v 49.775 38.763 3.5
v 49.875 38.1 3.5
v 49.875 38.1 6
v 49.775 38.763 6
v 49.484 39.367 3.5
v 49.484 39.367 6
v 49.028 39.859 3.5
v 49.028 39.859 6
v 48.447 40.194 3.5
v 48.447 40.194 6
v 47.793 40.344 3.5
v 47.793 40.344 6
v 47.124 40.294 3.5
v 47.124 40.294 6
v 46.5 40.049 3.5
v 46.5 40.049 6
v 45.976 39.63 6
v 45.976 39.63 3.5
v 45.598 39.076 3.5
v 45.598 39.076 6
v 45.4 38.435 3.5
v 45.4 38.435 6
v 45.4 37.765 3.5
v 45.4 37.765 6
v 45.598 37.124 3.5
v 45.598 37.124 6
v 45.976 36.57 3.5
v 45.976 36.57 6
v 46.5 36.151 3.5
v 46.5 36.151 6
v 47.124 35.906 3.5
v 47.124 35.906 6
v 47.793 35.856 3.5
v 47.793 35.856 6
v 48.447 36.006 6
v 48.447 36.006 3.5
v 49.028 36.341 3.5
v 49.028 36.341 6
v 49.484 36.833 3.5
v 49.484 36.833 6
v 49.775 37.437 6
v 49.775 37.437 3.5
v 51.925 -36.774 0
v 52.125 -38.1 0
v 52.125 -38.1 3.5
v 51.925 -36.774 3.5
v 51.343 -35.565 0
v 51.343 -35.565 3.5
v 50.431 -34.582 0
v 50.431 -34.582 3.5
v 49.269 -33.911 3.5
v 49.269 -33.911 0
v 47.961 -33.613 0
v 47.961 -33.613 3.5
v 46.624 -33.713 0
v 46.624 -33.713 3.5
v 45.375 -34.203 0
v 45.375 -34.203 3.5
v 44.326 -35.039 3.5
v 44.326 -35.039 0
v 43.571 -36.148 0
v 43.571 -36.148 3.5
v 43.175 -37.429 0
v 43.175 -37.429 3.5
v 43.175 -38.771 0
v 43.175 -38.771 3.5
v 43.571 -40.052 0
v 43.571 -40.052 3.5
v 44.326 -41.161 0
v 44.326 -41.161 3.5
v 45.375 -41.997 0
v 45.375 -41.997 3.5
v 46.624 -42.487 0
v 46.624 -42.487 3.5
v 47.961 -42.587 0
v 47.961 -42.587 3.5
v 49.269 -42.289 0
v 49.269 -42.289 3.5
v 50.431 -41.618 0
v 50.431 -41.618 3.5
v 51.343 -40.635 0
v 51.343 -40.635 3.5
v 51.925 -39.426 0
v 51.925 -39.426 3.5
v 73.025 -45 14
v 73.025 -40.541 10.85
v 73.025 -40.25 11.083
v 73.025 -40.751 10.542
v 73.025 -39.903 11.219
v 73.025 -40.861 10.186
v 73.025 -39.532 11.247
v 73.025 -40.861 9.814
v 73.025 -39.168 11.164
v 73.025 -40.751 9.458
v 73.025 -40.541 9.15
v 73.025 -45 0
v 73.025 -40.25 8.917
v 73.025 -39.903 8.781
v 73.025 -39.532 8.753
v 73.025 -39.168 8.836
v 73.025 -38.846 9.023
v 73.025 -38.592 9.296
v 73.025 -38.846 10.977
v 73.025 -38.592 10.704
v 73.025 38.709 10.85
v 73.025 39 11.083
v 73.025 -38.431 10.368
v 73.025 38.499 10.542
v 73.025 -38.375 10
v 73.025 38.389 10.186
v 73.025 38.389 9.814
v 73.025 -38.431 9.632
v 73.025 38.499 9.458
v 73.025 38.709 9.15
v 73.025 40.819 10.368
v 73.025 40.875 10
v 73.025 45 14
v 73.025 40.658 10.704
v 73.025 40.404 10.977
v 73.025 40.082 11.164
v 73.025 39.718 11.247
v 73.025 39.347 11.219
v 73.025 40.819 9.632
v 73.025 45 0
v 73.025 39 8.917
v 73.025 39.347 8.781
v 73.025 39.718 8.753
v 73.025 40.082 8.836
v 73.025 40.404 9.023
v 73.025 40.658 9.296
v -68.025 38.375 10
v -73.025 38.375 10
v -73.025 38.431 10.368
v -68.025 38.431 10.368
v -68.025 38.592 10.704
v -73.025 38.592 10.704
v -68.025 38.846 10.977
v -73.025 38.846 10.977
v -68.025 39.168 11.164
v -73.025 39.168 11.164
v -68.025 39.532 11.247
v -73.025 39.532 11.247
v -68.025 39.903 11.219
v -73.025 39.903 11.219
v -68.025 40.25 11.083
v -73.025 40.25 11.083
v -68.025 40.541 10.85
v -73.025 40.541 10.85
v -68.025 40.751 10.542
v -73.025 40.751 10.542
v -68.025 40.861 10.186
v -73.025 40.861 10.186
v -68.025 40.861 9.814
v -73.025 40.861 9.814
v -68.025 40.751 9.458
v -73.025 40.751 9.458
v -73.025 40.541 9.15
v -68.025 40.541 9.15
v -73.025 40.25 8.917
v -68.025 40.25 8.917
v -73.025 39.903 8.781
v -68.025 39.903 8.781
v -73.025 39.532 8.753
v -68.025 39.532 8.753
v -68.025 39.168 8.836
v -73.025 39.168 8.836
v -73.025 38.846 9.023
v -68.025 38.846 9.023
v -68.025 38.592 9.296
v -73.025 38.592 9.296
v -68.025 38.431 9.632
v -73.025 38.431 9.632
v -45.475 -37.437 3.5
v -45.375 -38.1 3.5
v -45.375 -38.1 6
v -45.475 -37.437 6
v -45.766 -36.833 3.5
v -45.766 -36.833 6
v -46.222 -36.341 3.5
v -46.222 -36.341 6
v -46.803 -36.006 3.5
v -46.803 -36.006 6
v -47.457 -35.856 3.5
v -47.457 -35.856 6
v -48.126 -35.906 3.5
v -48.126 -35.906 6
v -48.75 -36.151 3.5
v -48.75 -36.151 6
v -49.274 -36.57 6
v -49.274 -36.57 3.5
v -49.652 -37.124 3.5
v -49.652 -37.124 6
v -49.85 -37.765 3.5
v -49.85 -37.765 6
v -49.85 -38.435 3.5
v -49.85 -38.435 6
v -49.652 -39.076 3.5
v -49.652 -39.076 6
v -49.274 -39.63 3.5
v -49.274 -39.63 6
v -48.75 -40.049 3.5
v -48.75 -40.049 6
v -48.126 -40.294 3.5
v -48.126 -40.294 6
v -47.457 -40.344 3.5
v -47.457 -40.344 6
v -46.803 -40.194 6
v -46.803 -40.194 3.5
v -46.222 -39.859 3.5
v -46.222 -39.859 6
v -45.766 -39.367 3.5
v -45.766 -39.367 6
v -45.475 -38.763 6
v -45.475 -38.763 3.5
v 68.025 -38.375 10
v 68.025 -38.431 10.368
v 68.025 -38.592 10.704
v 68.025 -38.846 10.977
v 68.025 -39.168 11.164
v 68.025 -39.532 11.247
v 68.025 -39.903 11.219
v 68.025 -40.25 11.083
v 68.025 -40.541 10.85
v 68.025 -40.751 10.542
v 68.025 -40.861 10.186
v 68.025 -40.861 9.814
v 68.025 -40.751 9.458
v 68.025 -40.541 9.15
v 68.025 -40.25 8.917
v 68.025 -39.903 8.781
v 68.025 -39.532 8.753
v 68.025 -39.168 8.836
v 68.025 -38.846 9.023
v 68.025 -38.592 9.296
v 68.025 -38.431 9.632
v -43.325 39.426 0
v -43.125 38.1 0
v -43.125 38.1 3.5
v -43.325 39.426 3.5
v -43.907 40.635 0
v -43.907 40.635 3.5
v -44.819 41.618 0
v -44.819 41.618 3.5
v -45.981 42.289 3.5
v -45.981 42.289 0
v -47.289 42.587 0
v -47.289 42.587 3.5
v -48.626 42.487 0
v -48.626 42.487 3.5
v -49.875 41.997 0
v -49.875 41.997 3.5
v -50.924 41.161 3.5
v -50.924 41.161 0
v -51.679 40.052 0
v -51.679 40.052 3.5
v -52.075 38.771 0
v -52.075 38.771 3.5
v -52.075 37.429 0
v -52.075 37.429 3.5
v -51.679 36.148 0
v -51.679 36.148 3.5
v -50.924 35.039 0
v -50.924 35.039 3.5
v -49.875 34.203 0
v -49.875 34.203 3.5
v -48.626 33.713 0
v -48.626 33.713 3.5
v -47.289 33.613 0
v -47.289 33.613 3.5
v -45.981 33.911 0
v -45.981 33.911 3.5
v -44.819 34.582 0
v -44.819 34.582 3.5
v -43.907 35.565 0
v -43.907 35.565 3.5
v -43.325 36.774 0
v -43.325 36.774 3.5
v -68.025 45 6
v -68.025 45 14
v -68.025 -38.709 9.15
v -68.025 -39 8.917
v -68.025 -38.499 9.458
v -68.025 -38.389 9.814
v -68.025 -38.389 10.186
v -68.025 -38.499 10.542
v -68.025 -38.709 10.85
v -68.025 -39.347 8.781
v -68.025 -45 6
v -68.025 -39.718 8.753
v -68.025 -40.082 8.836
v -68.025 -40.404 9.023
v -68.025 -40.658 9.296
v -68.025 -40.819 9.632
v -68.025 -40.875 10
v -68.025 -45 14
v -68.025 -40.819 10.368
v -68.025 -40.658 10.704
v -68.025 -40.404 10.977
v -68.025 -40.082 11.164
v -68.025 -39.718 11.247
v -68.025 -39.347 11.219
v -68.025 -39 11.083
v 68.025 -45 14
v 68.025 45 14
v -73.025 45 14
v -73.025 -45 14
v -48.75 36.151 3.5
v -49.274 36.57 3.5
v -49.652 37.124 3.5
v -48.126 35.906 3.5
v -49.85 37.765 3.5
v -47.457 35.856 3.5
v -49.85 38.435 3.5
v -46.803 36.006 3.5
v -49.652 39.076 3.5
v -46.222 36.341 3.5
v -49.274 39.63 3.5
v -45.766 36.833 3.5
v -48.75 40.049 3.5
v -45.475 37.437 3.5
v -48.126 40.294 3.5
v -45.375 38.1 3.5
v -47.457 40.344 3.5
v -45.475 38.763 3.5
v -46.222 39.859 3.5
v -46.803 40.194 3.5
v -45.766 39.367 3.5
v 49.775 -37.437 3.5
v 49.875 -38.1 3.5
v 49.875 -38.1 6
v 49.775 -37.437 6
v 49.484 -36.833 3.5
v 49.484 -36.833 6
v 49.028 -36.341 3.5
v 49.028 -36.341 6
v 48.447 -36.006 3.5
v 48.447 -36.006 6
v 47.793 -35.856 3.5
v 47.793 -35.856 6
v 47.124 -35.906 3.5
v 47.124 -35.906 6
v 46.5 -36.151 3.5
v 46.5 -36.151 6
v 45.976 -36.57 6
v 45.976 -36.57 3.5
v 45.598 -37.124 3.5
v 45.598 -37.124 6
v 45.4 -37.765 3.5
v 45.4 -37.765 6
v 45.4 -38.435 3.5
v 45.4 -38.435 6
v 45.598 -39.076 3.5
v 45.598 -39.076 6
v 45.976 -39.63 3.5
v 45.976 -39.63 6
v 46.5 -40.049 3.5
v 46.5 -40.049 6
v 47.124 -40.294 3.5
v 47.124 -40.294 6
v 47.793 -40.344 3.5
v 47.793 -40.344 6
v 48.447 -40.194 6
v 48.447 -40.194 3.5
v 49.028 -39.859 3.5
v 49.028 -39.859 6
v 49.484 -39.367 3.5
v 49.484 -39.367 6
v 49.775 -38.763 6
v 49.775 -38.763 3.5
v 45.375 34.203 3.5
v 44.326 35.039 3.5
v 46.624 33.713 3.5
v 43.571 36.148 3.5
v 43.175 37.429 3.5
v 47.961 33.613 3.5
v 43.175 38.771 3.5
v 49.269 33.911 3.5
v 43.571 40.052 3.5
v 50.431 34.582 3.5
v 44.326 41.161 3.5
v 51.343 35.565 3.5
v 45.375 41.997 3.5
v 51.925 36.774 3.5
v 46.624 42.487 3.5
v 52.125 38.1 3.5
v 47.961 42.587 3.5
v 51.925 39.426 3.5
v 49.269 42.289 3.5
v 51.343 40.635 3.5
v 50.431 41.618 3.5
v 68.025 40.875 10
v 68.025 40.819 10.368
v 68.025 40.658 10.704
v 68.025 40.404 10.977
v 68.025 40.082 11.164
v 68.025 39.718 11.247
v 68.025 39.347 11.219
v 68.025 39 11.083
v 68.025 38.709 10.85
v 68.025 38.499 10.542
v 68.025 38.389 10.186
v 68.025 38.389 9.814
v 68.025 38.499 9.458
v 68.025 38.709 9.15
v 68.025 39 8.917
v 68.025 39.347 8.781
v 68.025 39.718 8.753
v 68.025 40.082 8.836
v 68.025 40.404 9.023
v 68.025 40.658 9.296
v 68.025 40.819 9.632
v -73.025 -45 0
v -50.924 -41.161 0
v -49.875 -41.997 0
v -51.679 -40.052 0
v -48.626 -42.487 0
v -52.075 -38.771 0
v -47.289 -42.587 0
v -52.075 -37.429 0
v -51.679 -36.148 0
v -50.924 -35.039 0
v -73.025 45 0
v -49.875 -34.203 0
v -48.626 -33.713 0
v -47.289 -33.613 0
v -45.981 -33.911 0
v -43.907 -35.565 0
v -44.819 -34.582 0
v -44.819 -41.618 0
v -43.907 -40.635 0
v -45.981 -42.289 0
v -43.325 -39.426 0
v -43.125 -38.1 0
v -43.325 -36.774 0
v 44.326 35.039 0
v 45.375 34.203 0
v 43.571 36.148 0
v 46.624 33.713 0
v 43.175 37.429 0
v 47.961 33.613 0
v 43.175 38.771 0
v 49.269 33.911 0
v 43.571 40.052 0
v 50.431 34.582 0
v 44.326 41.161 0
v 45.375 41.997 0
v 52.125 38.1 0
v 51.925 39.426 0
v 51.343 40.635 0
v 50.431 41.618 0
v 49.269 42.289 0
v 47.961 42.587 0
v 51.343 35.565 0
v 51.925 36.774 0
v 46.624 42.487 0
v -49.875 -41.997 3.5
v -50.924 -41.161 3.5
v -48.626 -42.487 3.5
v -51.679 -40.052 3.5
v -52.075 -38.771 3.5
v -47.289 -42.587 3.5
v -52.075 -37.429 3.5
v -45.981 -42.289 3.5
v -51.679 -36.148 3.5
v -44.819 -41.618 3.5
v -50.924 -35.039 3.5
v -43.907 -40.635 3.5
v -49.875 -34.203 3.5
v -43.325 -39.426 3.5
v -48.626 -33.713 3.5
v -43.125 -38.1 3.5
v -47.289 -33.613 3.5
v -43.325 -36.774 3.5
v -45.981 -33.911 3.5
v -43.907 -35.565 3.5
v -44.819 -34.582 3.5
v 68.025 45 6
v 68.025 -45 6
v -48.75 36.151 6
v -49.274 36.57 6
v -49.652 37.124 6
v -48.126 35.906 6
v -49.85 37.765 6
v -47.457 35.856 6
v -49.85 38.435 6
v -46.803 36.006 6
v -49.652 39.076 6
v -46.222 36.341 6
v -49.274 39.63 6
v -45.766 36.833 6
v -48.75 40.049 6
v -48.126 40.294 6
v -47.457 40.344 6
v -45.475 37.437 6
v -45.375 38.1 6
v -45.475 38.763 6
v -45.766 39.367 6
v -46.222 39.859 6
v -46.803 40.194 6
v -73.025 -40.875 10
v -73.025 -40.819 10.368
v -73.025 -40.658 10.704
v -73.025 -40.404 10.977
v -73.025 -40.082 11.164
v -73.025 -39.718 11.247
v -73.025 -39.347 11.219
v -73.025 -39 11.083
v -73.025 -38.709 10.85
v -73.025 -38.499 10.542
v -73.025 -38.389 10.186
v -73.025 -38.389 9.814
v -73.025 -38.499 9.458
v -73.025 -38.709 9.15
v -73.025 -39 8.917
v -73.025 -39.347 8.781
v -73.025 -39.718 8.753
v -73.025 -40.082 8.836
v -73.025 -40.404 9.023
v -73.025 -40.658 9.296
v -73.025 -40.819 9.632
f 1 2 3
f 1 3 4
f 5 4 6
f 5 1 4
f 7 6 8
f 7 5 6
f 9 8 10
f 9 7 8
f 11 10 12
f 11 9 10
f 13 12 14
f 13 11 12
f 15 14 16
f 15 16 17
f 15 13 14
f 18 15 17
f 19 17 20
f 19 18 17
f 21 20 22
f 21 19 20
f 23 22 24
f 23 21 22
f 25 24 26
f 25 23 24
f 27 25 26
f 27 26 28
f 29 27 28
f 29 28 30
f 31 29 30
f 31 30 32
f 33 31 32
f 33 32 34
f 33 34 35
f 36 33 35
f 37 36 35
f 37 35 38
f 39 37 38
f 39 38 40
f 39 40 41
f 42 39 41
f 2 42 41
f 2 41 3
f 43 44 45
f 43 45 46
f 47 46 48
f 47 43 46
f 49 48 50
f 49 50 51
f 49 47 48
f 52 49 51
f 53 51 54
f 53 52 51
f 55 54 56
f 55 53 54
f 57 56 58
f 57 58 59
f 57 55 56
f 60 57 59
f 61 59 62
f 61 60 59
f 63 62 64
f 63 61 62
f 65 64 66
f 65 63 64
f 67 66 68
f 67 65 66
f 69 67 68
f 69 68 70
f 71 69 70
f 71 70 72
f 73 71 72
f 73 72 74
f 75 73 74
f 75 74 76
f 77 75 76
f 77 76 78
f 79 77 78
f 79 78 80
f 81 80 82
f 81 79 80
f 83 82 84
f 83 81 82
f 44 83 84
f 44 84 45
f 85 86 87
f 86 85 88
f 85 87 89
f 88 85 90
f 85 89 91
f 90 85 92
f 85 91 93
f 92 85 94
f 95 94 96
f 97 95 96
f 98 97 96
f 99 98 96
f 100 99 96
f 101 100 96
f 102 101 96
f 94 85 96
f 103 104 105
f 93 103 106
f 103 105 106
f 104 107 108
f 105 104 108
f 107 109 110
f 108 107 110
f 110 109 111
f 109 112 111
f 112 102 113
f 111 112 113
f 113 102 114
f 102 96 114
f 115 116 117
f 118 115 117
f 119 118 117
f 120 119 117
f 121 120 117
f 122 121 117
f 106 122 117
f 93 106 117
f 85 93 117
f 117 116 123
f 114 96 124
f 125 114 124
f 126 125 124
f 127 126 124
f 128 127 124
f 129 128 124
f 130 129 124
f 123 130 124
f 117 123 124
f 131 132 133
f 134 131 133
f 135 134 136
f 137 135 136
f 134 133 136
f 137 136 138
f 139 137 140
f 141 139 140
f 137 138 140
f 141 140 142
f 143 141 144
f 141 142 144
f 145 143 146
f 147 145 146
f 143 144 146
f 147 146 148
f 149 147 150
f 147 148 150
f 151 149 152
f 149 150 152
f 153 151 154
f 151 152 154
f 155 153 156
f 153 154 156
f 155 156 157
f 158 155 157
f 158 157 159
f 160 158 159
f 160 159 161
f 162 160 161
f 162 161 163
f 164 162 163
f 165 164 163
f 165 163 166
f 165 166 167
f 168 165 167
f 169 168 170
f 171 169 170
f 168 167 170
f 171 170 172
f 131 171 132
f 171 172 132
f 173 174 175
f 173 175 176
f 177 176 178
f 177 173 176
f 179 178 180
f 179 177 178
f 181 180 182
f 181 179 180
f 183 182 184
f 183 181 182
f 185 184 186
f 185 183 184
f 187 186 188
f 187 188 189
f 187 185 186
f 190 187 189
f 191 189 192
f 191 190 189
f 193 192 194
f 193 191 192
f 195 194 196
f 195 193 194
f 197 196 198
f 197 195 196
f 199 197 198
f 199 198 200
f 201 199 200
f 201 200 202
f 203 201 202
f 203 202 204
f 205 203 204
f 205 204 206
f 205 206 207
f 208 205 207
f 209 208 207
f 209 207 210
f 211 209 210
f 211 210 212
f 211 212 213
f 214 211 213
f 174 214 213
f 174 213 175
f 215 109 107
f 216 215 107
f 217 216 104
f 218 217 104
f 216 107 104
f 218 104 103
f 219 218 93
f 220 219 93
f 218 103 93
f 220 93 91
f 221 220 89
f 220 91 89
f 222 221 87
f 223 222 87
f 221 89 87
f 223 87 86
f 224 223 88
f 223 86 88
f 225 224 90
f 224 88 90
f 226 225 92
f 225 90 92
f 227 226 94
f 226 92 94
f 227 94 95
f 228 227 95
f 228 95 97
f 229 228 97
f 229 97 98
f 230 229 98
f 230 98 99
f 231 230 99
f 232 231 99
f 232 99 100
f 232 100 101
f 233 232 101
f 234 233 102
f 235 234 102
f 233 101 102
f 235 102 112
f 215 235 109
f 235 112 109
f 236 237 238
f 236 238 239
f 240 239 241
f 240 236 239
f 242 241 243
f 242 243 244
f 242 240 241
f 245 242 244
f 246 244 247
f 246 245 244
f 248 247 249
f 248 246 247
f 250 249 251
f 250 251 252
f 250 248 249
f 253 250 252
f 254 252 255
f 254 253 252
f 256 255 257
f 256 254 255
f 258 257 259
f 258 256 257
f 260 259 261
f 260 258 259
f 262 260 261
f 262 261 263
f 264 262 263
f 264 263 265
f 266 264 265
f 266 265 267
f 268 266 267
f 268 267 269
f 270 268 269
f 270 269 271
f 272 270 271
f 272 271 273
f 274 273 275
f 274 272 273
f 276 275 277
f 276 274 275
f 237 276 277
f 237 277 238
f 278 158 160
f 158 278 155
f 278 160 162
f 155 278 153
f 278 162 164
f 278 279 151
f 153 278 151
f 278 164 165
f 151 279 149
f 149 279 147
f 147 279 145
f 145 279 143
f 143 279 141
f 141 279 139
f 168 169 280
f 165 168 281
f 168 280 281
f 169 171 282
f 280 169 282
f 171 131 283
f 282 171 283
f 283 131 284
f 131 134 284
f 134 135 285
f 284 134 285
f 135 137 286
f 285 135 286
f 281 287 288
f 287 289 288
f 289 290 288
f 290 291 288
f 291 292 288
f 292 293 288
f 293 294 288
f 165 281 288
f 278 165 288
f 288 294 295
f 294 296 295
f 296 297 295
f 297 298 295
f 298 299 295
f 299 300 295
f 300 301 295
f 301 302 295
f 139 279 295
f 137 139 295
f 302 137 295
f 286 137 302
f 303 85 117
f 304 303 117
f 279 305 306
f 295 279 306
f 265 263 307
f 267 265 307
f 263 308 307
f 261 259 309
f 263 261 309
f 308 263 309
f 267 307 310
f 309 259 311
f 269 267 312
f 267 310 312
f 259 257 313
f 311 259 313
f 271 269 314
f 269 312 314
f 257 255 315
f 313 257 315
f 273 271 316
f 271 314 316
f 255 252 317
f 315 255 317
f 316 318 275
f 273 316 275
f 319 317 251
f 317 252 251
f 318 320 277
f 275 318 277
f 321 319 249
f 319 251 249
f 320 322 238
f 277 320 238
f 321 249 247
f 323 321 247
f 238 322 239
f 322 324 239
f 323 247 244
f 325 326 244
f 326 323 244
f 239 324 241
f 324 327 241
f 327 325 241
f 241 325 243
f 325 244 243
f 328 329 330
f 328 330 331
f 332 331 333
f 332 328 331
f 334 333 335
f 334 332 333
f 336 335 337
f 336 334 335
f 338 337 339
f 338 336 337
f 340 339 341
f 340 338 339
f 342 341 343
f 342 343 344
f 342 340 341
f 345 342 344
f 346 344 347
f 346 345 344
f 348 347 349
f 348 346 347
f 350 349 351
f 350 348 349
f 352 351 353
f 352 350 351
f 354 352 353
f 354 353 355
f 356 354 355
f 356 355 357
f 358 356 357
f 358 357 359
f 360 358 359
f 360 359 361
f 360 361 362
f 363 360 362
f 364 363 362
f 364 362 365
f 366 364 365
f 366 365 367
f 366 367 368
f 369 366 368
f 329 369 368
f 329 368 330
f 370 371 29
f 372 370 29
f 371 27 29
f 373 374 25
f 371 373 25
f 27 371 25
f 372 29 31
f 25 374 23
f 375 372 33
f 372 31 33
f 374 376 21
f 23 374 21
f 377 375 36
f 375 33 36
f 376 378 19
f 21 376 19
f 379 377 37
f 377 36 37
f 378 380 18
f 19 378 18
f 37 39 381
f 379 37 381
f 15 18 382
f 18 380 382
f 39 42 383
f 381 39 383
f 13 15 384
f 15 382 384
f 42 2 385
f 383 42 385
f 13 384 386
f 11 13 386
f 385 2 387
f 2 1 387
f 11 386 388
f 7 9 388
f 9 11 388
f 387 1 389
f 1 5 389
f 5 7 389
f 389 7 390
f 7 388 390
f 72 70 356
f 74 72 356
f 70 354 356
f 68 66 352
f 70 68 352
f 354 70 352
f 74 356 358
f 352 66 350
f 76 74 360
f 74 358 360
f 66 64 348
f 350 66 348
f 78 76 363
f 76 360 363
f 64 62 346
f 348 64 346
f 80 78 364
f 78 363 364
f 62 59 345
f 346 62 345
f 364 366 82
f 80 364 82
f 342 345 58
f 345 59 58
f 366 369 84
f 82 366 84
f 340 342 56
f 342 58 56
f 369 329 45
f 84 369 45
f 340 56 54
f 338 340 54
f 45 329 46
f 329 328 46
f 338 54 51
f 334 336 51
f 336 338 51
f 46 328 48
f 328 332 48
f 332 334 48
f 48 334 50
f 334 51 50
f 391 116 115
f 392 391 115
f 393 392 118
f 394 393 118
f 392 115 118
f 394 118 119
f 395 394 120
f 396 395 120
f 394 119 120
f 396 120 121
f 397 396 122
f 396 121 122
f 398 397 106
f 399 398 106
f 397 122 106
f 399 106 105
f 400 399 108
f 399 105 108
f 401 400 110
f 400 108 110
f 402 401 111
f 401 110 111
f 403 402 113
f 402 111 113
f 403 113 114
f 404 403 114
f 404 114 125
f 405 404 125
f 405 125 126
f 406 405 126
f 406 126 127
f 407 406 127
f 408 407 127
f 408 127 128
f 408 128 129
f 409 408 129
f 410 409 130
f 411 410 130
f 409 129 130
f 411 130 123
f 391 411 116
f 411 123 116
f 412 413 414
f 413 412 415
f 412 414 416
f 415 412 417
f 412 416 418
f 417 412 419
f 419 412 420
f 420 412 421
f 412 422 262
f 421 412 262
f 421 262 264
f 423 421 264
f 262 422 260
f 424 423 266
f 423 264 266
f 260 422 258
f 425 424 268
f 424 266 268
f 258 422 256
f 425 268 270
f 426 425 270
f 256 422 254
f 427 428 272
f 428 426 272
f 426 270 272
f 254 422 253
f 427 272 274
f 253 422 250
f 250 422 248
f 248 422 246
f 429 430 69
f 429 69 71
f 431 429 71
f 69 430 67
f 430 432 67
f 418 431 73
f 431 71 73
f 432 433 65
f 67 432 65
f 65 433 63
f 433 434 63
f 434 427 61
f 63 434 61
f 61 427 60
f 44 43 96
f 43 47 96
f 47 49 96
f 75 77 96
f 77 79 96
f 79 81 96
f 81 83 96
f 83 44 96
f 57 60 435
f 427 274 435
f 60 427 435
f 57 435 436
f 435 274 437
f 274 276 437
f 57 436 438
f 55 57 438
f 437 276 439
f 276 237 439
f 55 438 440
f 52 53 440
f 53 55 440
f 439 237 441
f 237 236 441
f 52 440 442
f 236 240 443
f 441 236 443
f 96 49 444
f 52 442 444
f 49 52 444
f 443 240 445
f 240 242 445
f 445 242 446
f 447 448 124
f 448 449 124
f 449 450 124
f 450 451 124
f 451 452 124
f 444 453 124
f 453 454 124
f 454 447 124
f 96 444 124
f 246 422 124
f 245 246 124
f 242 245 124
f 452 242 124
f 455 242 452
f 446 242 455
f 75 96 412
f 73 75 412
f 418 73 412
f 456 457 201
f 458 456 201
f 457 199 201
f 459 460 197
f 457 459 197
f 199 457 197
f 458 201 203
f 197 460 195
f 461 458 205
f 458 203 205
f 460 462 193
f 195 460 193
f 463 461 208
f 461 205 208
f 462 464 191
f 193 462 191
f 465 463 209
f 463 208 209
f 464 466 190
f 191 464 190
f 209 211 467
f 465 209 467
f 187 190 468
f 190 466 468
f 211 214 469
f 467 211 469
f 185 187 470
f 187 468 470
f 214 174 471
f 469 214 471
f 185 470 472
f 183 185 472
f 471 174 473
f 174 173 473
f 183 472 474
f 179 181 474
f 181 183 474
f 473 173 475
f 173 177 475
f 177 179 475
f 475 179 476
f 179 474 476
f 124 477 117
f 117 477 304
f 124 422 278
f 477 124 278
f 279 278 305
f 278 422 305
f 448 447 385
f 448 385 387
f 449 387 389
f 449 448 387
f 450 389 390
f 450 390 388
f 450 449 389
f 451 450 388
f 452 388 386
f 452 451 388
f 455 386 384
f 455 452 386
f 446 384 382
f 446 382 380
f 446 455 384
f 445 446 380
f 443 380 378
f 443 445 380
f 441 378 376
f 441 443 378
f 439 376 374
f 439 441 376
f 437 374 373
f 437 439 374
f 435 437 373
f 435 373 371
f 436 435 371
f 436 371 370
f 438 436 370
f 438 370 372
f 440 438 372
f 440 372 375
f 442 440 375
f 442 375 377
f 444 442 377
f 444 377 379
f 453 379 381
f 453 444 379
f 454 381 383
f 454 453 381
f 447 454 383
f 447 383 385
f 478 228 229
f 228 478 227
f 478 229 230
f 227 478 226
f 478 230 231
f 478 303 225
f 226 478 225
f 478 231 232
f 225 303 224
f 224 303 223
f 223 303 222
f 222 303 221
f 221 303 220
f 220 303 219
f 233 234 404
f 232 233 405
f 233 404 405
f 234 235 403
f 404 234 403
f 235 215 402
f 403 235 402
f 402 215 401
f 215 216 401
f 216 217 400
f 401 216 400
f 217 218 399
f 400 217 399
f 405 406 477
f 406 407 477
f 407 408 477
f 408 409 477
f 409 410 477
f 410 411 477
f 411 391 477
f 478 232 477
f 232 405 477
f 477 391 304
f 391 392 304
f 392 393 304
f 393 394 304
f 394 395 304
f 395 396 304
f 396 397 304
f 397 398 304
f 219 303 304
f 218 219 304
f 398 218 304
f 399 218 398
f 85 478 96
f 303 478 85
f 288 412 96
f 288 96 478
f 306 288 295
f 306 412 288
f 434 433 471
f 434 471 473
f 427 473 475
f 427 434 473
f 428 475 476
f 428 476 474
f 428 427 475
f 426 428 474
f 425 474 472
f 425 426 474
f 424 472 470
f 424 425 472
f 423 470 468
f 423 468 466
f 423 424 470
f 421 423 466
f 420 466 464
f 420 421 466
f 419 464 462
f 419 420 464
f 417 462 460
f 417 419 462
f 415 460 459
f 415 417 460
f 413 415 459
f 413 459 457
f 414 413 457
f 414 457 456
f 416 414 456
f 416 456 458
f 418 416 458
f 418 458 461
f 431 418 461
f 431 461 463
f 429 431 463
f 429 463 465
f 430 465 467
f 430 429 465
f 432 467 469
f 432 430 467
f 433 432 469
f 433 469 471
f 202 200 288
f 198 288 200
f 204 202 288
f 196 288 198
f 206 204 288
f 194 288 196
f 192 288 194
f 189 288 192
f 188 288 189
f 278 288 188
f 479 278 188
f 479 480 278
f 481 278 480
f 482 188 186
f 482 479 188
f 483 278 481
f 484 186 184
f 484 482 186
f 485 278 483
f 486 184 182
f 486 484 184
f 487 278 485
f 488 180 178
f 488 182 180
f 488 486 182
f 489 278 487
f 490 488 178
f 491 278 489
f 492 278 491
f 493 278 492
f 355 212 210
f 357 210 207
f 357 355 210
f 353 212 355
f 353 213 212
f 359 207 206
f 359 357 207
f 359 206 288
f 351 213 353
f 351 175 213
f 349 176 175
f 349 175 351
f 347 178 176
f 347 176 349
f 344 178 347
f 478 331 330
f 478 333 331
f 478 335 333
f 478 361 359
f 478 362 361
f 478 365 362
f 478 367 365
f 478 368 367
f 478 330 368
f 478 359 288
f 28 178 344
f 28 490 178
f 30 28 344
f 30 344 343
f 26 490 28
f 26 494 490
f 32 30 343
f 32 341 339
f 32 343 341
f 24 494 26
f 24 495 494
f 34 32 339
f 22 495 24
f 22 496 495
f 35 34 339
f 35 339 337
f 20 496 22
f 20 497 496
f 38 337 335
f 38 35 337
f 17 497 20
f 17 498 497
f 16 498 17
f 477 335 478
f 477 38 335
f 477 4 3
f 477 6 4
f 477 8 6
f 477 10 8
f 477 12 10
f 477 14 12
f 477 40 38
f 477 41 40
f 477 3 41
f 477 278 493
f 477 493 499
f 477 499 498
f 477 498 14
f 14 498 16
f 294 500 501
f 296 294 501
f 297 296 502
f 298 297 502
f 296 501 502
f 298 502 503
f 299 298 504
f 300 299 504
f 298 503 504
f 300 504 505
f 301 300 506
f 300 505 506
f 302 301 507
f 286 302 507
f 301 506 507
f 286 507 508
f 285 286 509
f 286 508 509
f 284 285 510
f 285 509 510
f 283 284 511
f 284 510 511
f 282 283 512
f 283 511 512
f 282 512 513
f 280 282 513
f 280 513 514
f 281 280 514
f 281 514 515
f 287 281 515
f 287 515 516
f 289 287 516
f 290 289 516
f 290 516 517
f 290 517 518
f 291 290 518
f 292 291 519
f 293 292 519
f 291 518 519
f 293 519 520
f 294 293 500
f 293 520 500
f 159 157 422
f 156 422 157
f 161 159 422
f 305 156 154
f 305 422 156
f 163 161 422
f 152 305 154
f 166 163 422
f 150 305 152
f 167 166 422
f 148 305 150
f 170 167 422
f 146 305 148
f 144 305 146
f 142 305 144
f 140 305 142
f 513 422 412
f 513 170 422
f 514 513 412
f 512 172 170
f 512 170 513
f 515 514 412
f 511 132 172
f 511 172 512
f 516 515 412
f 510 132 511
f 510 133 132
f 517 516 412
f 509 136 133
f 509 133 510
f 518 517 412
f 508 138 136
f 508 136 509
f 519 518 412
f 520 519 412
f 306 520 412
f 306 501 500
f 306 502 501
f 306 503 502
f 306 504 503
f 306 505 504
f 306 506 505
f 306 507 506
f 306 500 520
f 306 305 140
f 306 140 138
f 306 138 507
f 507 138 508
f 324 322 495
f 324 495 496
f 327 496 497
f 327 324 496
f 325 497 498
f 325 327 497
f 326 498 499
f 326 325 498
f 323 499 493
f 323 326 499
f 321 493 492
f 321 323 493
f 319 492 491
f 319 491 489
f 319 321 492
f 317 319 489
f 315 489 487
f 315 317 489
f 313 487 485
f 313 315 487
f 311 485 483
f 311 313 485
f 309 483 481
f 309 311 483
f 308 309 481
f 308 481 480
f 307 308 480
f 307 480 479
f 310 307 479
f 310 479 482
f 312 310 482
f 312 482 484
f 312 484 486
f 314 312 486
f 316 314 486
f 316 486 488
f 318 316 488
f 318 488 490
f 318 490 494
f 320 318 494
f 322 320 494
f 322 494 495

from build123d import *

# Parameters (mm, degrees)
F0_W     = 146.05
F0_H     = 90
F0_R     = 4.5
F0_R_2   = 2.25
F1_DEPTH = 6
F2_DEPTH = 3.5
F3_W     = 90
F3_H     = 14
F3_R     = 1.25
F4_DEPTH = 5
F5_W     = 90
F5_H     = 8
F5_R     = 1.25
F6_DEPTH = 5


with BuildPart() as f1:
    # F0 (on Top) → F1 (new body)
    with BuildSketch(Plane.XY):
        Rectangle(F0_W, F0_H)
        with Locations((-47.625, -38.1)):
            Circle(F0_R, mode=Mode.SUBTRACT)
        with Locations((47.625, -38.1)):
            Circle(F0_R, mode=Mode.SUBTRACT)
        with Locations((-47.625, 38.1)):
            Circle(F0_R, mode=Mode.SUBTRACT)
        with Locations((47.625, 38.1)):
            Circle(F0_R, mode=Mode.SUBTRACT)
        with Locations((-47.625, 38.1)):
            Circle(F0_R)
        with Locations((-47.625, 38.1)):
            Circle(F0_R_2, mode=Mode.SUBTRACT)
        with Locations((-47.625, -38.1)):
            Circle(F0_R)
        with Locations((-47.625, -38.1)):
            Circle(F0_R_2, mode=Mode.SUBTRACT)
        with Locations((47.625, -38.1)):
            Circle(F0_R)
        with Locations((47.625, -38.1)):
            Circle(F0_R_2, mode=Mode.SUBTRACT)
        with Locations((47.625, 38.1)):
            Circle(F0_R)
        with Locations((47.625, 38.1)):
            Circle(F0_R_2, mode=Mode.SUBTRACT)
    extrude(amount=F1_DEPTH)

    # F0 (on Top) → F2 (cut)
    with BuildSketch(Plane.XY):
        with Locations((-47.625, 38.1)):
            Circle(F0_R)
        with Locations((-47.625, 38.1)):
            Circle(F0_R_2, mode=Mode.SUBTRACT)
        with Locations((-47.625, -38.1)):
            Circle(F0_R)
        with Locations((-47.625, -38.1)):
            Circle(F0_R_2, mode=Mode.SUBTRACT)
        with Locations((47.625, -38.1)):
            Circle(F0_R)
        with Locations((47.625, -38.1)):
            Circle(F0_R_2, mode=Mode.SUBTRACT)
        with Locations((47.625, 38.1)):
            Circle(F0_R)
        with Locations((47.625, 38.1)):
            Circle(F0_R_2, mode=Mode.SUBTRACT)
    extrude(amount=F2_DEPTH, mode=Mode.SUBTRACT)

    # F3 (on face) → F4 (join)
    with BuildSketch(Plane.YZ.offset(73.025)):
        with Locations((0, 7)):
            Rectangle(F3_W, F3_H)
        with Locations((-39.625, 10)):
            Circle(F3_R, mode=Mode.SUBTRACT)
        with Locations((39.625, 10)):
            Circle(F3_R, mode=Mode.SUBTRACT)
    extrude(amount=-F4_DEPTH)

    # F5 (on face) → F6 (join)
    with BuildSketch(Plane(origin=(-73.025, 0, 0), x_dir=(0, -1, 0), z_dir=(-1, 0, 0))):
        with Locations((0, 10)):
            Rectangle(F5_W, F5_H)
        with Locations((-39.625, 10)):
            Circle(F5_R, mode=Mode.SUBTRACT)
        with Locations((39.625, 10)):
            Circle(F5_R, mode=Mode.SUBTRACT)
    extrude(amount=-F6_DEPTH)


solid = f1.part
